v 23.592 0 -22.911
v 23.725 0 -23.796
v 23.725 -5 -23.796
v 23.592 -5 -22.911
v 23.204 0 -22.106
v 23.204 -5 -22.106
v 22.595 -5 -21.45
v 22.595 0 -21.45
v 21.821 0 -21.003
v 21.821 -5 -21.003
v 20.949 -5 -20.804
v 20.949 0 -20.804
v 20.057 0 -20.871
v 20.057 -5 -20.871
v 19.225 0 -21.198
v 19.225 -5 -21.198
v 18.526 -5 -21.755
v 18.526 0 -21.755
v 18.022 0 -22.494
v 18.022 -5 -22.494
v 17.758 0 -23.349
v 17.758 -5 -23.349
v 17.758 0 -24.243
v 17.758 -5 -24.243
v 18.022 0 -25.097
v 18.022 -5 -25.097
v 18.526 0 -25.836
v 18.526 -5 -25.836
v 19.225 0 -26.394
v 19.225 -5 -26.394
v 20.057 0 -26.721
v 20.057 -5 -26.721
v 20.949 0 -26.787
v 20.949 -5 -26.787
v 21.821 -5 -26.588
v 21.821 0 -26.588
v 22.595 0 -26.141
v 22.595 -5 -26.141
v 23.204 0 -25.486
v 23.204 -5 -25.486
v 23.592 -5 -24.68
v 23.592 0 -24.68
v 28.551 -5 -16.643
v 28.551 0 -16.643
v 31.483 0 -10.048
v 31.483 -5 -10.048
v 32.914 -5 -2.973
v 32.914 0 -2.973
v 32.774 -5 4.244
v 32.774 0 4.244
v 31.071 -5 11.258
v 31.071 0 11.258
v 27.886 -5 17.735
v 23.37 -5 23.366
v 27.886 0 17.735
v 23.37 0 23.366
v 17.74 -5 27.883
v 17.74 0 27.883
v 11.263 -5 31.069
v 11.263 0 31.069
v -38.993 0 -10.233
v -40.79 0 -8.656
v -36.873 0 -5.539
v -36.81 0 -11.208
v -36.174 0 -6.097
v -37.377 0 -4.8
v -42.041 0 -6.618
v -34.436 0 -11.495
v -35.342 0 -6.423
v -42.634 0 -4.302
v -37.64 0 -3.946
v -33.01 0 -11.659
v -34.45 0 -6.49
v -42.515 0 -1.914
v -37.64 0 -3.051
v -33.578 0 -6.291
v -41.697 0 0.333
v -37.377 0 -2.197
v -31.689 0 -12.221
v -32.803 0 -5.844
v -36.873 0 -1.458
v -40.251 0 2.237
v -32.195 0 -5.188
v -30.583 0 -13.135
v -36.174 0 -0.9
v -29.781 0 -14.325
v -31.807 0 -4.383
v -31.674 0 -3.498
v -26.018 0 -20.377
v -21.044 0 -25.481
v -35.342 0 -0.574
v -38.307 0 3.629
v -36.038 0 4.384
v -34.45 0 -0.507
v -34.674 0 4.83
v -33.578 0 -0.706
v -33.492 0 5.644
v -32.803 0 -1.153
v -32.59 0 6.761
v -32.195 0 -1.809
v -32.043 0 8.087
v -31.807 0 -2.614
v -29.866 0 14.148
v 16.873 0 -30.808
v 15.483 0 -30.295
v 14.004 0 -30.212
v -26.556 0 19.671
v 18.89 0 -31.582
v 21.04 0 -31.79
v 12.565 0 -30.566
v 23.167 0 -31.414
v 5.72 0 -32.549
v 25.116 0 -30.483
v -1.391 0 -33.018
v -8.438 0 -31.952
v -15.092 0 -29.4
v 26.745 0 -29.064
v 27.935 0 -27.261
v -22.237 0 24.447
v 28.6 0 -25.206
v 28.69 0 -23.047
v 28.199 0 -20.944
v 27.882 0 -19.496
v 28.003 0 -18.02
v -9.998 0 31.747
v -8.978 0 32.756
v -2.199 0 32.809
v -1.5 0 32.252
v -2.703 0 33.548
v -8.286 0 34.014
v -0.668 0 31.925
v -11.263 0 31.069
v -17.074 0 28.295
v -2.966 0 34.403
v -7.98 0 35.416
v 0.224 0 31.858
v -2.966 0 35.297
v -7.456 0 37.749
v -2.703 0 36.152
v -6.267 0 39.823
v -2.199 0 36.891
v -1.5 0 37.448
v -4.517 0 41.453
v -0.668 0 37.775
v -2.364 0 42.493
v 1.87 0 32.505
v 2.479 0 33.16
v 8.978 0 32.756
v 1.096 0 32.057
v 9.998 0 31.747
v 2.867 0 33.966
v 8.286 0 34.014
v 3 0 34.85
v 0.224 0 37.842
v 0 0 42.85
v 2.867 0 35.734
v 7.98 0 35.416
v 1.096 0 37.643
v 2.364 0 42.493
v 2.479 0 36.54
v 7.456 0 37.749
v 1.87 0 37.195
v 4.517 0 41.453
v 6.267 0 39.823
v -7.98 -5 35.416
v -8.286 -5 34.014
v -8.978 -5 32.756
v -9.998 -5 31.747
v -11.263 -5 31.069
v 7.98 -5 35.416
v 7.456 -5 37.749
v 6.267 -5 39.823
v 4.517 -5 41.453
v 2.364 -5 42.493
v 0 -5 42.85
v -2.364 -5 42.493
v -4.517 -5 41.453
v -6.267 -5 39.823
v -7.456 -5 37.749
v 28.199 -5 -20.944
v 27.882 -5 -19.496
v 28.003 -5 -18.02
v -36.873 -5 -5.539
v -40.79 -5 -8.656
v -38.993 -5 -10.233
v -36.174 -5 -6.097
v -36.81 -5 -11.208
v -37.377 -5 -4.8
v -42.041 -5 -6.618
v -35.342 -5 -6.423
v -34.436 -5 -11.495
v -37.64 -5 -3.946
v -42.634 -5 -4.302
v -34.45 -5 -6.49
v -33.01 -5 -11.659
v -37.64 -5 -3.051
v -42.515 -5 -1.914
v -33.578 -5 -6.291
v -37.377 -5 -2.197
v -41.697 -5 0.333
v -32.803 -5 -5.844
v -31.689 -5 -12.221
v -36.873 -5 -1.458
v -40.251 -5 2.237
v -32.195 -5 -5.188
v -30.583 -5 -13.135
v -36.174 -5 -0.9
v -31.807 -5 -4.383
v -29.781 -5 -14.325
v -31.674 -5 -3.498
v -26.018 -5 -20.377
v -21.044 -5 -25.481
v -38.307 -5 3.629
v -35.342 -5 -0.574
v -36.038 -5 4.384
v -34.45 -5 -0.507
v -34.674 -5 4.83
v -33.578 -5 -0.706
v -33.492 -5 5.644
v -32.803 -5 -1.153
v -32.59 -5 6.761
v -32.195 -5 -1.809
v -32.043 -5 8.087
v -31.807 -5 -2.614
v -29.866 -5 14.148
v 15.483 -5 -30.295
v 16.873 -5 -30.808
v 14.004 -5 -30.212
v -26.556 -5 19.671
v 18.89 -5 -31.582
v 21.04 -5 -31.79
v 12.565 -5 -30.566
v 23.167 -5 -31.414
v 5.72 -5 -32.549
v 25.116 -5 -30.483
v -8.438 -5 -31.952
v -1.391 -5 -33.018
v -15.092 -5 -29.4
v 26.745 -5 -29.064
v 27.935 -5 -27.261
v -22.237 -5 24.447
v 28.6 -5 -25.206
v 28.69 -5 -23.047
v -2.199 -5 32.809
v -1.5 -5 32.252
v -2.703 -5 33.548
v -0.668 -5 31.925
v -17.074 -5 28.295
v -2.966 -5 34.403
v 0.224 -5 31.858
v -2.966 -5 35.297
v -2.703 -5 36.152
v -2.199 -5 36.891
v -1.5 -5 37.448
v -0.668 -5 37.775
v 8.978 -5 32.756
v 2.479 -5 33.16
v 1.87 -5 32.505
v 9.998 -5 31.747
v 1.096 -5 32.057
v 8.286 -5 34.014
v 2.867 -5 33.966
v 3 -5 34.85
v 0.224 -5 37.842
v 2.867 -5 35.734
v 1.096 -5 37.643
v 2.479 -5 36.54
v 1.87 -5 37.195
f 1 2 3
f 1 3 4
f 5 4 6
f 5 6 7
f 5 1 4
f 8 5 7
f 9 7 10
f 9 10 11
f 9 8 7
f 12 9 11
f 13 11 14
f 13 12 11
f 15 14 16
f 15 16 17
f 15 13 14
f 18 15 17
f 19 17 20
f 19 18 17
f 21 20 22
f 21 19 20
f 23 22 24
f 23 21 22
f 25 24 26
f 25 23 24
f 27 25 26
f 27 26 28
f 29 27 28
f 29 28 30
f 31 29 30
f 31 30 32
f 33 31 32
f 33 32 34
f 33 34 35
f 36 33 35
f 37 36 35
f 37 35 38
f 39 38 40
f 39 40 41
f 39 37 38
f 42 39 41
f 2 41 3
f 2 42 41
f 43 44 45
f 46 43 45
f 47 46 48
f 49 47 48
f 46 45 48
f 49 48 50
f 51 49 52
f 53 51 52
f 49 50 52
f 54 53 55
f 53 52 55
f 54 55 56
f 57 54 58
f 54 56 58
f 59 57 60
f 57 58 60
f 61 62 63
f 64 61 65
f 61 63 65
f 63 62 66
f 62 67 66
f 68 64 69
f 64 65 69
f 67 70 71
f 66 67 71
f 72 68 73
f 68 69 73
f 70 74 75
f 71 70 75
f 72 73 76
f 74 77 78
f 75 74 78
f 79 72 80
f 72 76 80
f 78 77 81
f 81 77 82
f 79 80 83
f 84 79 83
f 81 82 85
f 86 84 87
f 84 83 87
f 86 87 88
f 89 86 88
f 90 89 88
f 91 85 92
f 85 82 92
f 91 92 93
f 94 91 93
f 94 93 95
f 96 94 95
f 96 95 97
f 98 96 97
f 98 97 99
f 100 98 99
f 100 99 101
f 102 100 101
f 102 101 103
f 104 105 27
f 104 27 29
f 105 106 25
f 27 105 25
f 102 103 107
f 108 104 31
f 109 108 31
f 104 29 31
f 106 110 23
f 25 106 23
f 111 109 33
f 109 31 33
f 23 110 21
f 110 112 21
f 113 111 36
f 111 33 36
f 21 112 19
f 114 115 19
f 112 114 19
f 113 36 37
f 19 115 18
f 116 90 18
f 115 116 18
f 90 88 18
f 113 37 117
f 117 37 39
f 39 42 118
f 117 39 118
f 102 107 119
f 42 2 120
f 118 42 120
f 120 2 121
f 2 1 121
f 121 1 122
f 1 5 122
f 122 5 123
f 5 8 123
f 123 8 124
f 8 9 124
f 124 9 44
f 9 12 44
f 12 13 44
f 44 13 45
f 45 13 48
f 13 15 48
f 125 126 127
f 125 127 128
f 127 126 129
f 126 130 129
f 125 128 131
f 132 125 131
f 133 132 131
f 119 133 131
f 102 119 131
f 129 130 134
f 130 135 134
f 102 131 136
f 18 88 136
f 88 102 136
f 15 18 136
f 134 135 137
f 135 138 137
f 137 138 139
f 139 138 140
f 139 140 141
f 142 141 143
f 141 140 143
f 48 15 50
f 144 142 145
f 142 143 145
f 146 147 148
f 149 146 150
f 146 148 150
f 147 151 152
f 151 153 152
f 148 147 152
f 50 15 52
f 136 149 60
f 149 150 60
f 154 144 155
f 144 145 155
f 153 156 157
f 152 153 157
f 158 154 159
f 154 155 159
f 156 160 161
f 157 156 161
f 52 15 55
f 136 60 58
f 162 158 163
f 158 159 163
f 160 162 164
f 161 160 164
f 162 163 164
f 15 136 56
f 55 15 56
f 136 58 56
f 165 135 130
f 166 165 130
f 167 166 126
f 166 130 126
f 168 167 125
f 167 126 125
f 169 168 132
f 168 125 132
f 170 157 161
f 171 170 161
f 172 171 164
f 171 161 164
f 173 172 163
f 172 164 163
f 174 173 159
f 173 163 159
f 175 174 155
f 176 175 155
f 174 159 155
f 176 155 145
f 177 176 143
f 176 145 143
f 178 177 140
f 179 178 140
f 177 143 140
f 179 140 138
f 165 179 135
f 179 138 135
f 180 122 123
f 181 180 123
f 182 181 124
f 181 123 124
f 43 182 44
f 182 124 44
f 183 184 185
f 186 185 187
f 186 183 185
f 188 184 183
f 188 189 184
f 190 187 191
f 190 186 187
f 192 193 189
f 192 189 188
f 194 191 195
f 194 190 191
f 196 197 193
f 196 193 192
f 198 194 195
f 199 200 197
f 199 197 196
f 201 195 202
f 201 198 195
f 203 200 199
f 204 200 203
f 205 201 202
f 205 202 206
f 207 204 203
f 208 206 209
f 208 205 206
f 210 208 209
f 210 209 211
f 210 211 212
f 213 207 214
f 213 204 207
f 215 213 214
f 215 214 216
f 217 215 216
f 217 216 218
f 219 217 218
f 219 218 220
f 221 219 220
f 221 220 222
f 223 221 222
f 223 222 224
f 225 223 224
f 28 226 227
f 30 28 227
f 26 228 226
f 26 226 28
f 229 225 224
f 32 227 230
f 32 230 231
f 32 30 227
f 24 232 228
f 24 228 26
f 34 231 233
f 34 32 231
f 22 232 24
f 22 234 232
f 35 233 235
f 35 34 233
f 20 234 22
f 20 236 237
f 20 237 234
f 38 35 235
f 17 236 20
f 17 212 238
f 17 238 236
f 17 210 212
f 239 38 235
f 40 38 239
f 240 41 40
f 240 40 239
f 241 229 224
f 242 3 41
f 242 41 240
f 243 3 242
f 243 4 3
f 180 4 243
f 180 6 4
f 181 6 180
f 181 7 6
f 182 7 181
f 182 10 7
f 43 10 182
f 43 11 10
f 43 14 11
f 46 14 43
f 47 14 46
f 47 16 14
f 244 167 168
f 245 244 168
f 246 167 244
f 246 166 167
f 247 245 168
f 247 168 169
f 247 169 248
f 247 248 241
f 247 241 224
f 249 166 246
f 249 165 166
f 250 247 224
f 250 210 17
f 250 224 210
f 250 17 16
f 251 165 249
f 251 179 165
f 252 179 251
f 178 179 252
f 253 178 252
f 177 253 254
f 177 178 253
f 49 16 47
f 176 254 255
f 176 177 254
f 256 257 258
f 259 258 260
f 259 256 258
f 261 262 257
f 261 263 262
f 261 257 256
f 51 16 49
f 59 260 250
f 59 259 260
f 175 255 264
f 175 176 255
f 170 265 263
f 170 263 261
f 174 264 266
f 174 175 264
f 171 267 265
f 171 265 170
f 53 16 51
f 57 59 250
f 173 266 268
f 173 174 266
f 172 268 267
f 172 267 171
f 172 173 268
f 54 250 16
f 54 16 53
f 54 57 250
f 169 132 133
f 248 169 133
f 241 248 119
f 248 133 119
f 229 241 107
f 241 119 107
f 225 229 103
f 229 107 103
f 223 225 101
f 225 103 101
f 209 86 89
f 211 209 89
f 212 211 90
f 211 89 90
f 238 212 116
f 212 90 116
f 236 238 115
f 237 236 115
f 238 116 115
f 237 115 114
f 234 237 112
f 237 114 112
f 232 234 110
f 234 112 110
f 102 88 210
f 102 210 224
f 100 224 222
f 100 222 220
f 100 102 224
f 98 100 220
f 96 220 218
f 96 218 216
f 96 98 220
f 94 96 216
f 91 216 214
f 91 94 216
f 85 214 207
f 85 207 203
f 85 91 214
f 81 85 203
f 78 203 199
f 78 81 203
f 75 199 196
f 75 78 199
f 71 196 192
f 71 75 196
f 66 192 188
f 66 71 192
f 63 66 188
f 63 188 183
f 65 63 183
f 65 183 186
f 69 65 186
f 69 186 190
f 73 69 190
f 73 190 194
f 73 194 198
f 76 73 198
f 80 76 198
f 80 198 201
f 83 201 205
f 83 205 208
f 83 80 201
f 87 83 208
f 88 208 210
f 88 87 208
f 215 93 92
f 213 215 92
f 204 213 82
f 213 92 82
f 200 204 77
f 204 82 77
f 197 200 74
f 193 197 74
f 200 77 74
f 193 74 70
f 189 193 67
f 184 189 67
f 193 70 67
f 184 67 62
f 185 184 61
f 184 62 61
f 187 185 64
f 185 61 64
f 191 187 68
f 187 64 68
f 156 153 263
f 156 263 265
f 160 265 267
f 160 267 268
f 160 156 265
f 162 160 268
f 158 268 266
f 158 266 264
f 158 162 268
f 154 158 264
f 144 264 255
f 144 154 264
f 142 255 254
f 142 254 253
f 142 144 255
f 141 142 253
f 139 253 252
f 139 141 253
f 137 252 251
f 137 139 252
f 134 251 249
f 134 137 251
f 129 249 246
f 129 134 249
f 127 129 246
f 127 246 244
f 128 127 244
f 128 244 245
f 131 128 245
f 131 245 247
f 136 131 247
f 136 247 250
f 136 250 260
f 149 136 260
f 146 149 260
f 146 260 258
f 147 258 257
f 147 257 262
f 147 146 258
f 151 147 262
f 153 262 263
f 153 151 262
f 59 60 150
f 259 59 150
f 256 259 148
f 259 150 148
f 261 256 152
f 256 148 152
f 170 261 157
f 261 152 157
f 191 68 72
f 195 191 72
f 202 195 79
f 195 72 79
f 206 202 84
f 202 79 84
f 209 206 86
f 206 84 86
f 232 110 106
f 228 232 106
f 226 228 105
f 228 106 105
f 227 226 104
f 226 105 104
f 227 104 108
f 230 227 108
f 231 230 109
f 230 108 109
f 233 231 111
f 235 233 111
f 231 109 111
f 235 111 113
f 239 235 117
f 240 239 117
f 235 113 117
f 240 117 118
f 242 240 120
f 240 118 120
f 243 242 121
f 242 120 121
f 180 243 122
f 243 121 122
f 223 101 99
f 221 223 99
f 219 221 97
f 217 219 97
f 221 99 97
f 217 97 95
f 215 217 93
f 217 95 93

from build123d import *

# Parameters (mm, degrees)
F0_R     = 3
F1_DEPTH = 5


with BuildPart() as f1:
    # F0 (on Front) → F1 (new body)
    with BuildSketch(Plane.XZ):
        with BuildLine():
            ThreePointArc((12.565296, -30.565649), (14.746833, -30.198005), (16.873467, -30.807674))
            ThreePointArc((16.873467, -30.807674), (25.97897, -29.828457), (28.199125, -20.94364))
            ThreePointArc((28.199125, -20.94364), (27.887223, -18.753438), (28.550916, -16.64304))
            ThreePointArc((28.550916, -16.64304), (31.070939, 11.257989), (11.263325, 31.069005))
            ThreePointArc((11.263325, 31.069005), (8.977661, 32.756053), (7.979957, 35.415936))
            ThreePointArc((7.979957, 35.415936), (0, 42.85), (-7.979957, 35.415936))
            ThreePointArc((-7.979957, 35.415936), (-8.977661, 32.756053), (-11.263325, 31.069005))
            ThreePointArc((-11.263325, 31.069005), (-24.513088, 22.164252), (-32.042752, 8.087498))
            ThreePointArc((-32.042752, 8.087498), (-33.491826, 5.644022), (-36.038116, 4.38434))
            ThreePointArc((-36.038116, 4.38434), (-42.633541, -4.301591), (-34.435945, -11.494952))
            ThreePointArc((-34.435945, -11.494952), (-31.689342, -12.220598), (-29.781365, -14.325358))
            ThreePointArc((-29.781365, -14.325358), (-11.833639, -30.856289), (12.565296, -30.565649))
        make_face()
        with Locations((-34.673953, -3.498494)):
            Circle(F0_R, mode=Mode.SUBTRACT)
        with Locations((20.7248, -23.795739)):
            Circle(F0_R, mode=Mode.SUBTRACT)
        with Locations((0, 34.85)):
            Circle(F0_R, mode=Mode.SUBTRACT)
    extrude(amount=F1_DEPTH)


solid = f1.part
